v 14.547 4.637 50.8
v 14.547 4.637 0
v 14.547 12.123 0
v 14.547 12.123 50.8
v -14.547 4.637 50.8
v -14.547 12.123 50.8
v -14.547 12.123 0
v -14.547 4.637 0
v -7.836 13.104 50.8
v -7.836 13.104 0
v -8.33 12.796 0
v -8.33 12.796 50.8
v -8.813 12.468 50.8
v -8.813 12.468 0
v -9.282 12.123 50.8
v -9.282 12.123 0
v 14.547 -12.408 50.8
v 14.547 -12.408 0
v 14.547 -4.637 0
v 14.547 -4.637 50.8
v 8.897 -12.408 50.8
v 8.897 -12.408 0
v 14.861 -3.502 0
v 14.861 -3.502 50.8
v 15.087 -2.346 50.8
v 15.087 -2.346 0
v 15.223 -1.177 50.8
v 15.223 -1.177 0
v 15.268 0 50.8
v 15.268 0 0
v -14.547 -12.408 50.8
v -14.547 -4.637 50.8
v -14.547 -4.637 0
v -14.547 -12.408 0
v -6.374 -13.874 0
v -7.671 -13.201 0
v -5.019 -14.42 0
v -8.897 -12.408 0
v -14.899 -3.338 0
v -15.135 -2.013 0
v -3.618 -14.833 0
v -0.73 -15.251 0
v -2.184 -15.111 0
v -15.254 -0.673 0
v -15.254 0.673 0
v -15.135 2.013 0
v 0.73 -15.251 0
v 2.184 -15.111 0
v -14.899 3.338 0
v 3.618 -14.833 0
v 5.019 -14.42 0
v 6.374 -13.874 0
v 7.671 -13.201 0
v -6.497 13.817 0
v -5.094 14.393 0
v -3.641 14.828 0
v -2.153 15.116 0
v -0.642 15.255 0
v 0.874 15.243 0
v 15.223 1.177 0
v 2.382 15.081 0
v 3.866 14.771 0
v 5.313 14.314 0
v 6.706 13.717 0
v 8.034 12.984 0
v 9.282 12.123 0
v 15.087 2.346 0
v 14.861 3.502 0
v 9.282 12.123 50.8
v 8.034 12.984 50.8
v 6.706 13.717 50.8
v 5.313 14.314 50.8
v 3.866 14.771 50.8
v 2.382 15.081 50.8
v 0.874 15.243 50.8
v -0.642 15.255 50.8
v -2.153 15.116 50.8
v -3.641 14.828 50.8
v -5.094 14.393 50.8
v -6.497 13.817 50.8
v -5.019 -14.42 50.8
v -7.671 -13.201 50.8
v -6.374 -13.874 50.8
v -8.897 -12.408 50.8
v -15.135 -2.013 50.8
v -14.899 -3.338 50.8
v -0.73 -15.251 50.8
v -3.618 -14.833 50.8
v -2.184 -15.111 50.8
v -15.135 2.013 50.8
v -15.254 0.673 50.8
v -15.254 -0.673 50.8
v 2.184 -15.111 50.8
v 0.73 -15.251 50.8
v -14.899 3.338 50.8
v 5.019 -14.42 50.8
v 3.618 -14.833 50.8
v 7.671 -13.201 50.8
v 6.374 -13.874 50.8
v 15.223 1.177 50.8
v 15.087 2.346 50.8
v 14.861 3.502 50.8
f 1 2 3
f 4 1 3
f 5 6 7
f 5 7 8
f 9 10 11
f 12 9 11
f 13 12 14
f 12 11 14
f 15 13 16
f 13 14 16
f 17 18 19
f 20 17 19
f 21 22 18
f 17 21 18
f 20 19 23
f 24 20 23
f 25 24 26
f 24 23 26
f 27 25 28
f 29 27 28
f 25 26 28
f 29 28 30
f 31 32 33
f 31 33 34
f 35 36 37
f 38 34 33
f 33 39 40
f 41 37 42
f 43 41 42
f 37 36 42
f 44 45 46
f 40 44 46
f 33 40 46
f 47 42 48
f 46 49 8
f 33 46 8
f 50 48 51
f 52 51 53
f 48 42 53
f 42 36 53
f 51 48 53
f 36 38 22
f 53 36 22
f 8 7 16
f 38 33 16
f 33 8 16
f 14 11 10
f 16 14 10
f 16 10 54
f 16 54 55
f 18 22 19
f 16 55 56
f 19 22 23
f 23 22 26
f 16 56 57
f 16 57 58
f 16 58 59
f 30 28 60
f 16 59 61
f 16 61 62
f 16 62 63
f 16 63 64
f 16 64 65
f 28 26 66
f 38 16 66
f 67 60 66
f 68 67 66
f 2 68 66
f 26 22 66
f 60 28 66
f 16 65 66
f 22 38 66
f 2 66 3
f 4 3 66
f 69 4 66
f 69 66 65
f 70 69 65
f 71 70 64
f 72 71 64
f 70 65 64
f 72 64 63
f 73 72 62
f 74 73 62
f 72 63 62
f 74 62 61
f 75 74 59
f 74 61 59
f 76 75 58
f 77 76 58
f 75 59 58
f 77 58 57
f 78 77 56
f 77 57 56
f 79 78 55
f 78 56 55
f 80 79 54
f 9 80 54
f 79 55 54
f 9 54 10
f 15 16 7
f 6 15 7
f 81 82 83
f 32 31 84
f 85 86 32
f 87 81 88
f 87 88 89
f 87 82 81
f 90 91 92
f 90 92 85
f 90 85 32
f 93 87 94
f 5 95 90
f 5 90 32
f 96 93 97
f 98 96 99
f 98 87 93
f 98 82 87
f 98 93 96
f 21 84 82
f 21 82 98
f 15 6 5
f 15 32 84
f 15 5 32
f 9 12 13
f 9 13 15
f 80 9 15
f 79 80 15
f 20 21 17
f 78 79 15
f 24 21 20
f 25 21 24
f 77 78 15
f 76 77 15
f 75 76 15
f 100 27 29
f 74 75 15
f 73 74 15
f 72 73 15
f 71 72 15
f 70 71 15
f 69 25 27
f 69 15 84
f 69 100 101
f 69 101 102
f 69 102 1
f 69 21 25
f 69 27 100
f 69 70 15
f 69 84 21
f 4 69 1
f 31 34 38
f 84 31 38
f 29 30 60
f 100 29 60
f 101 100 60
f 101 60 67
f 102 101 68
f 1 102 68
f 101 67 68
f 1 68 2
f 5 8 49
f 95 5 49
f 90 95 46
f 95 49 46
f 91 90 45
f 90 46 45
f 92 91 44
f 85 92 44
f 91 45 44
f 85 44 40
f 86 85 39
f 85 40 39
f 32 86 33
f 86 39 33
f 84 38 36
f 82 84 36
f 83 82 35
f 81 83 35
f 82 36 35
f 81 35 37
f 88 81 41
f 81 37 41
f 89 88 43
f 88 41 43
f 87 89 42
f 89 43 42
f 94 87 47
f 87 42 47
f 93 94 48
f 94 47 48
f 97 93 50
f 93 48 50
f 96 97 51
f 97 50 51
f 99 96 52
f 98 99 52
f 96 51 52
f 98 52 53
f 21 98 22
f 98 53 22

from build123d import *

# Parameters (mm, degrees)
F1_DEPTH = 50.8


with BuildPart() as f1:
    # F0 (on Top) → F1 (new body)
    with BuildSketch(Plane.XY):
        with BuildLine():
            ThreePointArc((14.5472735167, -4.6368075466), (15.087019572, -2.3462718145), (15.2683709345, 0))
            ThreePointArc((15.2683709345, 0), (15.087019572, 2.3462718145), (14.5472735167, 4.6368075466))
            Line((14.5472735167, 4.6368075466), (14.5472735167, -4.6368075466))
        make_face()
        with BuildLine():
            Line((14.5472735167, -4.6368075466), (14.5472735167, 4.6368075466))
            ThreePointArc((14.5472735167, 4.6368075466), (12.4889100158, 8.783523075), (9.2823821573, 12.1227279305))
            Line((9.2823821573, 12.1227279305), (0, 12.1227279305))
            Line((0, 12.1227279305), (-7.8358159836, 12.1227279305))
            Line((-7.8358159836, 12.1227279305), (-9.2823821573, 12.1227279305))
            ThreePointArc((-9.2823821573, 12.1227279305), (-12.4889108979, 8.7835218208), (-14.547274448, 4.6368046247))
            Line((-14.547274448, 4.6368046247), (-14.547274448, -4.6368046247))
            ThreePointArc((-14.547274448, -4.6368046247), (-12.3495786547, -8.9783661121), (-8.8974988368, -12.4079678208))
            Line((-8.8974988368, -12.4079678208), (8.8974988368, -12.4079678208))
            ThreePointArc((8.8974988368, -12.4079678208), (12.349577753, -8.9783673524), (14.5472735167, -4.6368075466))
        make_face()
        with BuildLine():
            ThreePointArc((9.2823821573, 12.1227279305), (12.4889100158, 8.783523075), (14.5472735167, 4.6368075466))
            Line((14.5472735167, 4.6368075466), (14.5472735167, 12.1227279305))
            Line((14.5472735167, 12.1227279305), (9.2823821573, 12.1227279305))
        make_face()
        with BuildLine():
            Line((14.5472735167, -12.4079678208), (14.5472735167, -4.6368075466))
            ThreePointArc((14.5472735167, -4.6368075466), (12.349577753, -8.9783673524), (8.8974988368, -12.4079678208))
            Line((8.8974988368, -12.4079678208), (14.5472735167, -12.4079678208))
        make_face()
        with BuildLine():
            Line((0, 12.1227279305), (9.2823821573, 12.1227279305))
            ThreePointArc((9.2823821573, 12.1227279305), (0.8740812186, 15.2433307717), (-7.8358159836, 13.1043175658))
            Line((-7.8358159836, 13.1043175658), (-7.8358159836, 12.1227279305))
            Line((-7.8358159836, 12.1227279305), (0, 12.1227279305))
        make_face()
        with BuildLine():
            ThreePointArc((-8.8974988368, -12.4079678208), (0, -15.2683709345), (8.8974988368, -12.4079678208))
            Line((8.8974988368, -12.4079678208), (-8.8974988368, -12.4079678208))
        make_face()
        with BuildLine():
            Line((-7.8358159836, 12.1227279305), (-7.8358159836, 13.1043175658))
            ThreePointArc((-7.8358159836, 13.1043175658), (-8.5731590707, 12.6342429351), (-9.2823821573, 12.1227279305))
            Line((-9.2823821573, 12.1227279305), (-7.8358159836, 12.1227279305))
        make_face()
        with BuildLine():
            Line((-14.547274448, -12.4079678208), (-8.8974988368, -12.4079678208))
            ThreePointArc((-8.8974988368, -12.4079678208), (-12.3495786547, -8.9783661121), (-14.547274448, -4.6368046247))
            Line((-14.547274448, -4.6368046247), (-14.547274448, -12.4079678208))
        make_face()
        with BuildLine():
            ThreePointArc((-14.547274448, 4.6368046247), (-12.4889108979, 8.7835218208), (-9.2823821573, 12.1227279305))
            Line((-9.2823821573, 12.1227279305), (-14.547274448, 12.1227279305))
            Line((-14.547274448, 12.1227279305), (-14.547274448, 4.6368046247))
        make_face()
        with BuildLine():
            ThreePointArc((-14.547274448, 4.6368046247), (-15.2683709345, 0), (-14.547274448, -4.6368046247))
            Line((-14.547274448, -4.6368046247), (-14.547274448, 4.6368046247))
        make_face()
    extrude(amount=F1_DEPTH)


solid = f1.part
